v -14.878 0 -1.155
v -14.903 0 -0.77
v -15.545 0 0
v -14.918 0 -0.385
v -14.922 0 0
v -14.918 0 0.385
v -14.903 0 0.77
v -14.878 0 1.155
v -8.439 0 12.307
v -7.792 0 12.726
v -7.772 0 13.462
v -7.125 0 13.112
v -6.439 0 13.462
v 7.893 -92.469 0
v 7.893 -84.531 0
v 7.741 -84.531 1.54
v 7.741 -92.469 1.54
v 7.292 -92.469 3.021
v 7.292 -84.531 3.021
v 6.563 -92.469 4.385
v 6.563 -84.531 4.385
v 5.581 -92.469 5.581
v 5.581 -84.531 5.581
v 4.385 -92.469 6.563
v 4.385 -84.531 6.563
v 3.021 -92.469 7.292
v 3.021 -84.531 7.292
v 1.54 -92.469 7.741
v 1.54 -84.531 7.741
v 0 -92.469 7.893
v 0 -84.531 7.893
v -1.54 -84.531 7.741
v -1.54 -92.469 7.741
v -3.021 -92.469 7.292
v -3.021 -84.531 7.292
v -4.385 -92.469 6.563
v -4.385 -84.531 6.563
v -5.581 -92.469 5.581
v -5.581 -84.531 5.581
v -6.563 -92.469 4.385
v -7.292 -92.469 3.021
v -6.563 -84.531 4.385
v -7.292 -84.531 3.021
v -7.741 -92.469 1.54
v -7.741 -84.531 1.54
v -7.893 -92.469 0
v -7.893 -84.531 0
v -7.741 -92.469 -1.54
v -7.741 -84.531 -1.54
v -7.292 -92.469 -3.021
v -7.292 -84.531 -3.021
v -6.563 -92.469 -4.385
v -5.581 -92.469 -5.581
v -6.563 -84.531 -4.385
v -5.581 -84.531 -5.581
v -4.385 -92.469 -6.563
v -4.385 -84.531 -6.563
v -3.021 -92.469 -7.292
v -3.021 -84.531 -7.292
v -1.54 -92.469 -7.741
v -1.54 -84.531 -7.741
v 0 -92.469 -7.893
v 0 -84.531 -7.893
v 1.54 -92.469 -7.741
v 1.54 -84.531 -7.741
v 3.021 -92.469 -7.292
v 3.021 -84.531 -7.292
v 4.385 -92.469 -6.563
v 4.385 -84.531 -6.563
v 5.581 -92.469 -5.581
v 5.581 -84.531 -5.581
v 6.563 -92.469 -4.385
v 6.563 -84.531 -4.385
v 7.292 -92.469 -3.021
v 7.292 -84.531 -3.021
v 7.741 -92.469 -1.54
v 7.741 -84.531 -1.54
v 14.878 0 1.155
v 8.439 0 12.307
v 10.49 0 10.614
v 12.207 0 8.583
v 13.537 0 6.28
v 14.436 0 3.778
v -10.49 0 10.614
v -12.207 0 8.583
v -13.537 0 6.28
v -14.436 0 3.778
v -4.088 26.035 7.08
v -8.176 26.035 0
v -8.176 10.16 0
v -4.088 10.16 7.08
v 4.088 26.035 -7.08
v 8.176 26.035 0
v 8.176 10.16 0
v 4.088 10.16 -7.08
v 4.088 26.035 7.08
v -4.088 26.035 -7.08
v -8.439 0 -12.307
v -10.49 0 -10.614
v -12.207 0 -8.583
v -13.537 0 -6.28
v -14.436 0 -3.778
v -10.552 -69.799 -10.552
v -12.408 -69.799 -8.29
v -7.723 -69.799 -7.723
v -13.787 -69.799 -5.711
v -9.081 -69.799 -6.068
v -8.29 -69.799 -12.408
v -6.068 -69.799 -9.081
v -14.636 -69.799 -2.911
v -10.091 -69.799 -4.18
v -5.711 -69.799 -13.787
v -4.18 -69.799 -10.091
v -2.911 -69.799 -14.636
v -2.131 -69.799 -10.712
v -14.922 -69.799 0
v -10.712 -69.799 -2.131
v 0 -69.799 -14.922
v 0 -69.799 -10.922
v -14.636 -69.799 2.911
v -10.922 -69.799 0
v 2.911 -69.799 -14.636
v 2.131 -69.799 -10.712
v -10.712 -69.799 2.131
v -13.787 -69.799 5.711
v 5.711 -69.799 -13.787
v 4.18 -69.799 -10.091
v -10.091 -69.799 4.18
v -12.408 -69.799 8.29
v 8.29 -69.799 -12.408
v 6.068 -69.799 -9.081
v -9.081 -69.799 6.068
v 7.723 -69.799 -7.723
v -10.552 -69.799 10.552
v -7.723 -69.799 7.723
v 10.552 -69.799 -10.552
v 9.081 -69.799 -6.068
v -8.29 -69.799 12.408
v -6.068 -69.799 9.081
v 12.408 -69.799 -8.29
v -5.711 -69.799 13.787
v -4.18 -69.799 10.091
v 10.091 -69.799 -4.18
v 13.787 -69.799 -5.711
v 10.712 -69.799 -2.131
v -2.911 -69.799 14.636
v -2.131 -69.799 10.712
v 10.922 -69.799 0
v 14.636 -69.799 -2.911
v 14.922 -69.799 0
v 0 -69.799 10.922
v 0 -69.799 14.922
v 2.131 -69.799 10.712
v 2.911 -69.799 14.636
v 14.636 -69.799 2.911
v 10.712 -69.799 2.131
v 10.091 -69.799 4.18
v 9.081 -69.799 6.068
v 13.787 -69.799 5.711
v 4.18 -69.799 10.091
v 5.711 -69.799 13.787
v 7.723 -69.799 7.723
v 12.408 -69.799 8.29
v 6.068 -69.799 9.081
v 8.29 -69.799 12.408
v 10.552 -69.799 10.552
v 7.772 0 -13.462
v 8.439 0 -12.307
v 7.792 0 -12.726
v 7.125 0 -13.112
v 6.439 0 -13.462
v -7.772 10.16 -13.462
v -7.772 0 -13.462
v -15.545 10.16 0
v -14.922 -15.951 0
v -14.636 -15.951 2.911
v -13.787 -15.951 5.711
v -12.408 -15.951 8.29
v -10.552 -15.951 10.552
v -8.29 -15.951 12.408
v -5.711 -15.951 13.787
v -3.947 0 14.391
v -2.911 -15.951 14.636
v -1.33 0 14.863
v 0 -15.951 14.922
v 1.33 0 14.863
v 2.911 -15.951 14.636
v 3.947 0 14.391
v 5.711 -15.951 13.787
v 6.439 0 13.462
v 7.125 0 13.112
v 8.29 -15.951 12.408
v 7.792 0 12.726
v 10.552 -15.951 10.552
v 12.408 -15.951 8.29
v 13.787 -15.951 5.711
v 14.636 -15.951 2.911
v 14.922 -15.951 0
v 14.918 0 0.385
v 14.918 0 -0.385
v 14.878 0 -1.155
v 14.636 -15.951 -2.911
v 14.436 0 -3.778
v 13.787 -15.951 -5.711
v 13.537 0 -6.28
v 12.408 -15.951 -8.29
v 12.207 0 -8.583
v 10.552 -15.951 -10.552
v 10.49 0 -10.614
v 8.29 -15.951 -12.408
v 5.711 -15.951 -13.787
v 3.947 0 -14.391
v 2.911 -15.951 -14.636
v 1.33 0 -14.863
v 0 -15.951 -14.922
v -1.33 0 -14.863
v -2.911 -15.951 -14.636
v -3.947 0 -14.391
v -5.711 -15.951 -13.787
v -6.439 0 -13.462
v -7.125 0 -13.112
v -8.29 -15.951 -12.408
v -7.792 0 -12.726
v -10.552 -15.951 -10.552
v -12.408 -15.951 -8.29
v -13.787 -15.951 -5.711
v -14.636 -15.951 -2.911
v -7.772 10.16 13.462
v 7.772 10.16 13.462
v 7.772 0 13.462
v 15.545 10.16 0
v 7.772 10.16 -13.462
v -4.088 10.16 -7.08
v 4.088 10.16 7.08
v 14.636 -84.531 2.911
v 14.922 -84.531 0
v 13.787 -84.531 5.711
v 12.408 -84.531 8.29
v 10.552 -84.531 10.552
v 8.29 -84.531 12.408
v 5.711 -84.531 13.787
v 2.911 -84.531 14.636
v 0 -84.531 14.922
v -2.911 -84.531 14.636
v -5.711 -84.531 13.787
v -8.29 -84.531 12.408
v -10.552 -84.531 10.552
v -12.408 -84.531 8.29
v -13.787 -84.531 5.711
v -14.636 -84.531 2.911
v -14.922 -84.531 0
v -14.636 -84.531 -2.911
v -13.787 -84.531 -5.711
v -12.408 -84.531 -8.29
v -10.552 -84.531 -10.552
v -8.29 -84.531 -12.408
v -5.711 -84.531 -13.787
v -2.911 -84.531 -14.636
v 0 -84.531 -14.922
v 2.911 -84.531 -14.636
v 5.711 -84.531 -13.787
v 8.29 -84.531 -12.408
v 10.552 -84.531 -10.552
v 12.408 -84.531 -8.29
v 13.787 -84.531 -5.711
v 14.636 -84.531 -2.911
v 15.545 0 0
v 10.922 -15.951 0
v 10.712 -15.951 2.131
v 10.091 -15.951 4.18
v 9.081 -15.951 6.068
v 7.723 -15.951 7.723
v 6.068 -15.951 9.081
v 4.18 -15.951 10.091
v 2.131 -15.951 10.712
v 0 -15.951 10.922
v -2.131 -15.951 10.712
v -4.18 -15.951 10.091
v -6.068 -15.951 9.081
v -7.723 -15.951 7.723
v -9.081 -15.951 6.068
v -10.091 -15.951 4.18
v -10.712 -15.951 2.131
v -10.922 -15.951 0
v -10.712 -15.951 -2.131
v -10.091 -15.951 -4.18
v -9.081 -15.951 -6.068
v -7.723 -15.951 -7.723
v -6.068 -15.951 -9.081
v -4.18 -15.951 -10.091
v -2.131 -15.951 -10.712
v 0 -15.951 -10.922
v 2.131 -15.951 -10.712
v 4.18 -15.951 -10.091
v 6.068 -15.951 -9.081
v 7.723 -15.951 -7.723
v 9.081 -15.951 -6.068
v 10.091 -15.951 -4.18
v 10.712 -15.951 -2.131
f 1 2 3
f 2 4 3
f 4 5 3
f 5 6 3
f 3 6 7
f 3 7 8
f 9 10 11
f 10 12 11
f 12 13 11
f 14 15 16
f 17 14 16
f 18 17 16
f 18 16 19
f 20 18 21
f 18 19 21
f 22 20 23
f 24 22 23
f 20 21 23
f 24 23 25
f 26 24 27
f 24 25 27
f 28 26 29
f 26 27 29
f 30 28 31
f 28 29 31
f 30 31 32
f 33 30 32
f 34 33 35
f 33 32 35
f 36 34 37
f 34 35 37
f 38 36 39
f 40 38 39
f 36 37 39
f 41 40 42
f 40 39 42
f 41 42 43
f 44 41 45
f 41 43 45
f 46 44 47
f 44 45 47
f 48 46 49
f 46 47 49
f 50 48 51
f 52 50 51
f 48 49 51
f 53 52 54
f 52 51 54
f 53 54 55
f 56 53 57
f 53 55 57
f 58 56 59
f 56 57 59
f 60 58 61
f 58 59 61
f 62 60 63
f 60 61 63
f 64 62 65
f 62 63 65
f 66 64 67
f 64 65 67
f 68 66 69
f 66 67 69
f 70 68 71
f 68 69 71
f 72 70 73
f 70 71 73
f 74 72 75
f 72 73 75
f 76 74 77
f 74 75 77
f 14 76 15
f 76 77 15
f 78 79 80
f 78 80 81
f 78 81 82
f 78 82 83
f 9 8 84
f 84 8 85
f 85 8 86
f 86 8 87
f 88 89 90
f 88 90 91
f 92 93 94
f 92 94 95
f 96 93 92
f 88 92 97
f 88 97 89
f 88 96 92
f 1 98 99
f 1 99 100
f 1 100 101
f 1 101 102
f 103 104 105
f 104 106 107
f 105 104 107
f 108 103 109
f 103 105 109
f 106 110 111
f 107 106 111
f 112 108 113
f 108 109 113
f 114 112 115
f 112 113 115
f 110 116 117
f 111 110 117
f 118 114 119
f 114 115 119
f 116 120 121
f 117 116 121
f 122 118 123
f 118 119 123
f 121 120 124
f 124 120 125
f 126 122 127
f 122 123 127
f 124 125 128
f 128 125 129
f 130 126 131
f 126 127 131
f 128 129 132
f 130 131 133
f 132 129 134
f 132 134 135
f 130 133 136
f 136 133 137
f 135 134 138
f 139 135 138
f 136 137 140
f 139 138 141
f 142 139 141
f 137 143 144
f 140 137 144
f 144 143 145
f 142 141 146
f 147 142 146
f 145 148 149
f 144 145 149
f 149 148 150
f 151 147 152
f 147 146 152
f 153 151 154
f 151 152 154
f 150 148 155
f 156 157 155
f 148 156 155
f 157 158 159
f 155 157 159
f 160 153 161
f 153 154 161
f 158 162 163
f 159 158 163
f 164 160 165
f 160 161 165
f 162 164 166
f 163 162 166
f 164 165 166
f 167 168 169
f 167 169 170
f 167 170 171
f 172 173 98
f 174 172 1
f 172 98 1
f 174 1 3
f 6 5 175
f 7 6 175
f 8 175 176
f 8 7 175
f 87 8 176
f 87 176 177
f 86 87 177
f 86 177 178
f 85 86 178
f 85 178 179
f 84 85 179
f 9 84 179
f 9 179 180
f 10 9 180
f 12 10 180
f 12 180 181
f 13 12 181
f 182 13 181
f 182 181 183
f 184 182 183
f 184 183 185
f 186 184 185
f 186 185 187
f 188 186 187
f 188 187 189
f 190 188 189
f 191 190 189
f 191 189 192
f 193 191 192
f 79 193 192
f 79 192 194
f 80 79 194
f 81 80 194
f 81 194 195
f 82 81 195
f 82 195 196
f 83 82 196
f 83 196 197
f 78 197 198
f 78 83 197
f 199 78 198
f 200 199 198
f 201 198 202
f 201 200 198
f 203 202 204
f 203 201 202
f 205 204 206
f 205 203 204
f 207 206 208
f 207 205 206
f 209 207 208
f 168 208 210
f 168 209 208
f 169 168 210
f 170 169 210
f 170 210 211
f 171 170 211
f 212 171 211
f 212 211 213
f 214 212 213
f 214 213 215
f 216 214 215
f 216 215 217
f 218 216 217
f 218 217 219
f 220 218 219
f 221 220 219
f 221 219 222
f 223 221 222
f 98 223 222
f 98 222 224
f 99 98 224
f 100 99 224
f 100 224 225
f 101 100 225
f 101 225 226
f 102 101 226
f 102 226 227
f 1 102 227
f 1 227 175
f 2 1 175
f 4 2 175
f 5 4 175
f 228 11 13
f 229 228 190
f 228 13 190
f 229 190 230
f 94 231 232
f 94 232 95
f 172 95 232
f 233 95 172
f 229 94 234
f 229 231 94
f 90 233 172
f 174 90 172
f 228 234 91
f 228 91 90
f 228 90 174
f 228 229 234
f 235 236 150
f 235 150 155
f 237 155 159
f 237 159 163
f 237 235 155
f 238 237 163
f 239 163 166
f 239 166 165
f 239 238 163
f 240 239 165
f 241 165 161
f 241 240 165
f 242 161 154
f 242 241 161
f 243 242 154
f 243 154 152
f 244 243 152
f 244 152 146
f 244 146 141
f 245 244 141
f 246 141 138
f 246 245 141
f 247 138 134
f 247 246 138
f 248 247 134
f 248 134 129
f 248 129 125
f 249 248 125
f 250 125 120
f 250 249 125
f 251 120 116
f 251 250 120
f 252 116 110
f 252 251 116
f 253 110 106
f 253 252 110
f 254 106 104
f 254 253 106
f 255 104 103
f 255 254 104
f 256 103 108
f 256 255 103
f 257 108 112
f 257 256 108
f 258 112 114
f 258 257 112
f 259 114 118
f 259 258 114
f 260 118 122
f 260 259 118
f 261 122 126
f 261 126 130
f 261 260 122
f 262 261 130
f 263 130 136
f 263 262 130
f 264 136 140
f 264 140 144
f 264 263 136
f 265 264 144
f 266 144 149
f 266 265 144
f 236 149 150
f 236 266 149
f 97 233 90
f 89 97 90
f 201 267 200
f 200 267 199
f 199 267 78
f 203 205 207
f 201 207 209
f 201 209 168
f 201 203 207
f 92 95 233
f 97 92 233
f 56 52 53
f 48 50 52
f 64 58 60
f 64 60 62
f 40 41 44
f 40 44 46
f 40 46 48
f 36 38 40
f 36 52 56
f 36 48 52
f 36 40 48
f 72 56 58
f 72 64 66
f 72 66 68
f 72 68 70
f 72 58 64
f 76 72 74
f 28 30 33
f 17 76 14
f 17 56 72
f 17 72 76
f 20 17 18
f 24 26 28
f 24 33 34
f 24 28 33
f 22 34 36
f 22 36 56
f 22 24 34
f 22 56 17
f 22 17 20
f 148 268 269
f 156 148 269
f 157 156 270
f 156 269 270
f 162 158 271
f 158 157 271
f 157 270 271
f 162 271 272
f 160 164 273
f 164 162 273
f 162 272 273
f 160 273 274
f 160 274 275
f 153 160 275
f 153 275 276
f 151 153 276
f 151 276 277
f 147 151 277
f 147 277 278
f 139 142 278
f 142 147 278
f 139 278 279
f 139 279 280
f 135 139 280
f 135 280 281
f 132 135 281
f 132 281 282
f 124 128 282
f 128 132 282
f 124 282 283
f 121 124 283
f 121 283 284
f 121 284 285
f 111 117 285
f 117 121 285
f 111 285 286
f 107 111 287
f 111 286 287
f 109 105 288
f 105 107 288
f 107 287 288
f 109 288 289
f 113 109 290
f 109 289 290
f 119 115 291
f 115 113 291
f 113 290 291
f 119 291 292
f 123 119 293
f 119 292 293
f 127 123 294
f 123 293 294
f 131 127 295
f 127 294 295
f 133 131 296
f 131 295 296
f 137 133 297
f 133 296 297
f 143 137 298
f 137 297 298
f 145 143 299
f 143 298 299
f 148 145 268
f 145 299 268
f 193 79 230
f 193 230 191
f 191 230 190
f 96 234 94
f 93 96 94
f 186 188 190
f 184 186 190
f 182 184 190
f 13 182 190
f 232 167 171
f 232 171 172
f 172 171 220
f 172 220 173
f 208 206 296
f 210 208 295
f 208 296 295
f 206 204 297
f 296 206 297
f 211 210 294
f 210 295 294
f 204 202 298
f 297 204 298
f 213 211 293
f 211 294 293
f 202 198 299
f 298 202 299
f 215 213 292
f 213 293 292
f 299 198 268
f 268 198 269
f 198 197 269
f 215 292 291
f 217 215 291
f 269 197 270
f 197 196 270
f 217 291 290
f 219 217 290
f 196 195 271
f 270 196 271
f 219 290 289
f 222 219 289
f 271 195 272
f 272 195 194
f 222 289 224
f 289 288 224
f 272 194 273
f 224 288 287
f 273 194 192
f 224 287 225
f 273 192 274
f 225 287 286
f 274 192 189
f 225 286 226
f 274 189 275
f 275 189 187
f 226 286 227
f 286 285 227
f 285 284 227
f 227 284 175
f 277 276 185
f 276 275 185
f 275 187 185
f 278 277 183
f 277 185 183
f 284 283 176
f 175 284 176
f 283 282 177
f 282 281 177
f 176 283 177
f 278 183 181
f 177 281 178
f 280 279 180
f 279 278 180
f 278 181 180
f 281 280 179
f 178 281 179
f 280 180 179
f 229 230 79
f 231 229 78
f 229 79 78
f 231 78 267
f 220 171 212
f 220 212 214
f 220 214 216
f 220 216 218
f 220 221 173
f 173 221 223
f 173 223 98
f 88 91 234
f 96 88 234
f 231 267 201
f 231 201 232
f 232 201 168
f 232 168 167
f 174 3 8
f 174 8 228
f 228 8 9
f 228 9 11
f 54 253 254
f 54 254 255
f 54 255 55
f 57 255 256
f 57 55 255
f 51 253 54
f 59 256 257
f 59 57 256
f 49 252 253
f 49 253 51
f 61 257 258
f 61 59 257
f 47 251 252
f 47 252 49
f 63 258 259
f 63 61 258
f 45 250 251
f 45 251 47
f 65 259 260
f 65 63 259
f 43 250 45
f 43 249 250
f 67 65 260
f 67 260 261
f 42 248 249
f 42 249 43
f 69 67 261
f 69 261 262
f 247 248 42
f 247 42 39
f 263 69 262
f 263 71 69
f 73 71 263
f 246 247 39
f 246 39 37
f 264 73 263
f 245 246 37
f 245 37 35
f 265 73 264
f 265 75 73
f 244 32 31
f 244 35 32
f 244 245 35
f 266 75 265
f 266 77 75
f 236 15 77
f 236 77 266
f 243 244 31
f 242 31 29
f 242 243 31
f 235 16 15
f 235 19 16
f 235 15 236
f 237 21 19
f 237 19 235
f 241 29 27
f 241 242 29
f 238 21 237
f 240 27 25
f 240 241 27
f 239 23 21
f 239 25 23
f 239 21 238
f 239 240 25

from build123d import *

# Parameters (mm, degrees)
F0_R       = 10.922
F1_DEPTH   = 68.58
F2_R       = 14.9225
F1_FACE1_R = 10.922
F3_DEPTH   = 15.9512
F4_R       = 14.9225
F5_DEPTH   = 14.732
F6_R       = 7.89305
F3_FACE1_R = 14.9225
F7_DEPTH   = 7.9375
F9_DEPTH   = 10.16
F11_DEPTH  = 15.875


with BuildPart() as f1:
    # F0 (on Front) → F1 (new body)
    with BuildSketch(Plane.XZ):
        Circle(F0_R)
    extrude(amount=F1_DEPTH)

    # F2 (on face) + F1_face1 (on face) → F3 (join)
    with BuildSketch(Plane(origin=(0, 0, 0), x_dir=(-1, 0, 0), z_dir=(0, 1, 0))):
        Circle(F2_R)
    with BuildSketch(Plane.XZ.offset(68.58)):
        Circle(F1_FACE1_R)
    extrude(amount=-F3_DEPTH, dir=(0, 1, 0))

    # F4 (on face) → F5 (join)
    with BuildSketch(Plane.XZ.offset(84.5312)):
        Circle(F4_R)
    extrude(amount=-F5_DEPTH)

    # F6 (on face) + F3_face1 (on face) → F7 (join)
    with BuildSketch(Plane.XZ.offset(84.5312)):
        Circle(F6_R)
    with BuildSketch(Plane(origin=(0, 0, 0), x_dir=(-1, 0, 0), z_dir=(0, 1, 0))):
        Circle(F3_FACE1_R)
    extrude(amount=F7_DEPTH, dir=(0, -1, 0))

    # F8 (on face) → F9 (join)
    with BuildSketch(Plane(origin=(0, 0, 0), x_dir=(-1, 0, 0), z_dir=(0, 1, 0))):
        Polygon((-7.7722893238, -13.462), (7.7722893238, -13.462), (15.5445786477, 0), (7.7722893238, 13.462), (-7.7722893238, 13.462), (-15.5445786477, 0), align=None)
    extrude(amount=F9_DEPTH)

    # F10 (on face) → F11 (join)
    with BuildSketch(Plane(origin=(0, 10.16, 0), x_dir=(-1, 0, 0), z_dir=(0, 1, 0))):
        Polygon((-4.0877842434, -7.08025), (4.0877842434, -7.08025), (8.1755684869, 0), (4.0877842434, 7.08025), (-4.0877842434, 7.08025), (-8.1755684869, 0), align=None)
    extrude(amount=F11_DEPTH)


solid = f1.part
